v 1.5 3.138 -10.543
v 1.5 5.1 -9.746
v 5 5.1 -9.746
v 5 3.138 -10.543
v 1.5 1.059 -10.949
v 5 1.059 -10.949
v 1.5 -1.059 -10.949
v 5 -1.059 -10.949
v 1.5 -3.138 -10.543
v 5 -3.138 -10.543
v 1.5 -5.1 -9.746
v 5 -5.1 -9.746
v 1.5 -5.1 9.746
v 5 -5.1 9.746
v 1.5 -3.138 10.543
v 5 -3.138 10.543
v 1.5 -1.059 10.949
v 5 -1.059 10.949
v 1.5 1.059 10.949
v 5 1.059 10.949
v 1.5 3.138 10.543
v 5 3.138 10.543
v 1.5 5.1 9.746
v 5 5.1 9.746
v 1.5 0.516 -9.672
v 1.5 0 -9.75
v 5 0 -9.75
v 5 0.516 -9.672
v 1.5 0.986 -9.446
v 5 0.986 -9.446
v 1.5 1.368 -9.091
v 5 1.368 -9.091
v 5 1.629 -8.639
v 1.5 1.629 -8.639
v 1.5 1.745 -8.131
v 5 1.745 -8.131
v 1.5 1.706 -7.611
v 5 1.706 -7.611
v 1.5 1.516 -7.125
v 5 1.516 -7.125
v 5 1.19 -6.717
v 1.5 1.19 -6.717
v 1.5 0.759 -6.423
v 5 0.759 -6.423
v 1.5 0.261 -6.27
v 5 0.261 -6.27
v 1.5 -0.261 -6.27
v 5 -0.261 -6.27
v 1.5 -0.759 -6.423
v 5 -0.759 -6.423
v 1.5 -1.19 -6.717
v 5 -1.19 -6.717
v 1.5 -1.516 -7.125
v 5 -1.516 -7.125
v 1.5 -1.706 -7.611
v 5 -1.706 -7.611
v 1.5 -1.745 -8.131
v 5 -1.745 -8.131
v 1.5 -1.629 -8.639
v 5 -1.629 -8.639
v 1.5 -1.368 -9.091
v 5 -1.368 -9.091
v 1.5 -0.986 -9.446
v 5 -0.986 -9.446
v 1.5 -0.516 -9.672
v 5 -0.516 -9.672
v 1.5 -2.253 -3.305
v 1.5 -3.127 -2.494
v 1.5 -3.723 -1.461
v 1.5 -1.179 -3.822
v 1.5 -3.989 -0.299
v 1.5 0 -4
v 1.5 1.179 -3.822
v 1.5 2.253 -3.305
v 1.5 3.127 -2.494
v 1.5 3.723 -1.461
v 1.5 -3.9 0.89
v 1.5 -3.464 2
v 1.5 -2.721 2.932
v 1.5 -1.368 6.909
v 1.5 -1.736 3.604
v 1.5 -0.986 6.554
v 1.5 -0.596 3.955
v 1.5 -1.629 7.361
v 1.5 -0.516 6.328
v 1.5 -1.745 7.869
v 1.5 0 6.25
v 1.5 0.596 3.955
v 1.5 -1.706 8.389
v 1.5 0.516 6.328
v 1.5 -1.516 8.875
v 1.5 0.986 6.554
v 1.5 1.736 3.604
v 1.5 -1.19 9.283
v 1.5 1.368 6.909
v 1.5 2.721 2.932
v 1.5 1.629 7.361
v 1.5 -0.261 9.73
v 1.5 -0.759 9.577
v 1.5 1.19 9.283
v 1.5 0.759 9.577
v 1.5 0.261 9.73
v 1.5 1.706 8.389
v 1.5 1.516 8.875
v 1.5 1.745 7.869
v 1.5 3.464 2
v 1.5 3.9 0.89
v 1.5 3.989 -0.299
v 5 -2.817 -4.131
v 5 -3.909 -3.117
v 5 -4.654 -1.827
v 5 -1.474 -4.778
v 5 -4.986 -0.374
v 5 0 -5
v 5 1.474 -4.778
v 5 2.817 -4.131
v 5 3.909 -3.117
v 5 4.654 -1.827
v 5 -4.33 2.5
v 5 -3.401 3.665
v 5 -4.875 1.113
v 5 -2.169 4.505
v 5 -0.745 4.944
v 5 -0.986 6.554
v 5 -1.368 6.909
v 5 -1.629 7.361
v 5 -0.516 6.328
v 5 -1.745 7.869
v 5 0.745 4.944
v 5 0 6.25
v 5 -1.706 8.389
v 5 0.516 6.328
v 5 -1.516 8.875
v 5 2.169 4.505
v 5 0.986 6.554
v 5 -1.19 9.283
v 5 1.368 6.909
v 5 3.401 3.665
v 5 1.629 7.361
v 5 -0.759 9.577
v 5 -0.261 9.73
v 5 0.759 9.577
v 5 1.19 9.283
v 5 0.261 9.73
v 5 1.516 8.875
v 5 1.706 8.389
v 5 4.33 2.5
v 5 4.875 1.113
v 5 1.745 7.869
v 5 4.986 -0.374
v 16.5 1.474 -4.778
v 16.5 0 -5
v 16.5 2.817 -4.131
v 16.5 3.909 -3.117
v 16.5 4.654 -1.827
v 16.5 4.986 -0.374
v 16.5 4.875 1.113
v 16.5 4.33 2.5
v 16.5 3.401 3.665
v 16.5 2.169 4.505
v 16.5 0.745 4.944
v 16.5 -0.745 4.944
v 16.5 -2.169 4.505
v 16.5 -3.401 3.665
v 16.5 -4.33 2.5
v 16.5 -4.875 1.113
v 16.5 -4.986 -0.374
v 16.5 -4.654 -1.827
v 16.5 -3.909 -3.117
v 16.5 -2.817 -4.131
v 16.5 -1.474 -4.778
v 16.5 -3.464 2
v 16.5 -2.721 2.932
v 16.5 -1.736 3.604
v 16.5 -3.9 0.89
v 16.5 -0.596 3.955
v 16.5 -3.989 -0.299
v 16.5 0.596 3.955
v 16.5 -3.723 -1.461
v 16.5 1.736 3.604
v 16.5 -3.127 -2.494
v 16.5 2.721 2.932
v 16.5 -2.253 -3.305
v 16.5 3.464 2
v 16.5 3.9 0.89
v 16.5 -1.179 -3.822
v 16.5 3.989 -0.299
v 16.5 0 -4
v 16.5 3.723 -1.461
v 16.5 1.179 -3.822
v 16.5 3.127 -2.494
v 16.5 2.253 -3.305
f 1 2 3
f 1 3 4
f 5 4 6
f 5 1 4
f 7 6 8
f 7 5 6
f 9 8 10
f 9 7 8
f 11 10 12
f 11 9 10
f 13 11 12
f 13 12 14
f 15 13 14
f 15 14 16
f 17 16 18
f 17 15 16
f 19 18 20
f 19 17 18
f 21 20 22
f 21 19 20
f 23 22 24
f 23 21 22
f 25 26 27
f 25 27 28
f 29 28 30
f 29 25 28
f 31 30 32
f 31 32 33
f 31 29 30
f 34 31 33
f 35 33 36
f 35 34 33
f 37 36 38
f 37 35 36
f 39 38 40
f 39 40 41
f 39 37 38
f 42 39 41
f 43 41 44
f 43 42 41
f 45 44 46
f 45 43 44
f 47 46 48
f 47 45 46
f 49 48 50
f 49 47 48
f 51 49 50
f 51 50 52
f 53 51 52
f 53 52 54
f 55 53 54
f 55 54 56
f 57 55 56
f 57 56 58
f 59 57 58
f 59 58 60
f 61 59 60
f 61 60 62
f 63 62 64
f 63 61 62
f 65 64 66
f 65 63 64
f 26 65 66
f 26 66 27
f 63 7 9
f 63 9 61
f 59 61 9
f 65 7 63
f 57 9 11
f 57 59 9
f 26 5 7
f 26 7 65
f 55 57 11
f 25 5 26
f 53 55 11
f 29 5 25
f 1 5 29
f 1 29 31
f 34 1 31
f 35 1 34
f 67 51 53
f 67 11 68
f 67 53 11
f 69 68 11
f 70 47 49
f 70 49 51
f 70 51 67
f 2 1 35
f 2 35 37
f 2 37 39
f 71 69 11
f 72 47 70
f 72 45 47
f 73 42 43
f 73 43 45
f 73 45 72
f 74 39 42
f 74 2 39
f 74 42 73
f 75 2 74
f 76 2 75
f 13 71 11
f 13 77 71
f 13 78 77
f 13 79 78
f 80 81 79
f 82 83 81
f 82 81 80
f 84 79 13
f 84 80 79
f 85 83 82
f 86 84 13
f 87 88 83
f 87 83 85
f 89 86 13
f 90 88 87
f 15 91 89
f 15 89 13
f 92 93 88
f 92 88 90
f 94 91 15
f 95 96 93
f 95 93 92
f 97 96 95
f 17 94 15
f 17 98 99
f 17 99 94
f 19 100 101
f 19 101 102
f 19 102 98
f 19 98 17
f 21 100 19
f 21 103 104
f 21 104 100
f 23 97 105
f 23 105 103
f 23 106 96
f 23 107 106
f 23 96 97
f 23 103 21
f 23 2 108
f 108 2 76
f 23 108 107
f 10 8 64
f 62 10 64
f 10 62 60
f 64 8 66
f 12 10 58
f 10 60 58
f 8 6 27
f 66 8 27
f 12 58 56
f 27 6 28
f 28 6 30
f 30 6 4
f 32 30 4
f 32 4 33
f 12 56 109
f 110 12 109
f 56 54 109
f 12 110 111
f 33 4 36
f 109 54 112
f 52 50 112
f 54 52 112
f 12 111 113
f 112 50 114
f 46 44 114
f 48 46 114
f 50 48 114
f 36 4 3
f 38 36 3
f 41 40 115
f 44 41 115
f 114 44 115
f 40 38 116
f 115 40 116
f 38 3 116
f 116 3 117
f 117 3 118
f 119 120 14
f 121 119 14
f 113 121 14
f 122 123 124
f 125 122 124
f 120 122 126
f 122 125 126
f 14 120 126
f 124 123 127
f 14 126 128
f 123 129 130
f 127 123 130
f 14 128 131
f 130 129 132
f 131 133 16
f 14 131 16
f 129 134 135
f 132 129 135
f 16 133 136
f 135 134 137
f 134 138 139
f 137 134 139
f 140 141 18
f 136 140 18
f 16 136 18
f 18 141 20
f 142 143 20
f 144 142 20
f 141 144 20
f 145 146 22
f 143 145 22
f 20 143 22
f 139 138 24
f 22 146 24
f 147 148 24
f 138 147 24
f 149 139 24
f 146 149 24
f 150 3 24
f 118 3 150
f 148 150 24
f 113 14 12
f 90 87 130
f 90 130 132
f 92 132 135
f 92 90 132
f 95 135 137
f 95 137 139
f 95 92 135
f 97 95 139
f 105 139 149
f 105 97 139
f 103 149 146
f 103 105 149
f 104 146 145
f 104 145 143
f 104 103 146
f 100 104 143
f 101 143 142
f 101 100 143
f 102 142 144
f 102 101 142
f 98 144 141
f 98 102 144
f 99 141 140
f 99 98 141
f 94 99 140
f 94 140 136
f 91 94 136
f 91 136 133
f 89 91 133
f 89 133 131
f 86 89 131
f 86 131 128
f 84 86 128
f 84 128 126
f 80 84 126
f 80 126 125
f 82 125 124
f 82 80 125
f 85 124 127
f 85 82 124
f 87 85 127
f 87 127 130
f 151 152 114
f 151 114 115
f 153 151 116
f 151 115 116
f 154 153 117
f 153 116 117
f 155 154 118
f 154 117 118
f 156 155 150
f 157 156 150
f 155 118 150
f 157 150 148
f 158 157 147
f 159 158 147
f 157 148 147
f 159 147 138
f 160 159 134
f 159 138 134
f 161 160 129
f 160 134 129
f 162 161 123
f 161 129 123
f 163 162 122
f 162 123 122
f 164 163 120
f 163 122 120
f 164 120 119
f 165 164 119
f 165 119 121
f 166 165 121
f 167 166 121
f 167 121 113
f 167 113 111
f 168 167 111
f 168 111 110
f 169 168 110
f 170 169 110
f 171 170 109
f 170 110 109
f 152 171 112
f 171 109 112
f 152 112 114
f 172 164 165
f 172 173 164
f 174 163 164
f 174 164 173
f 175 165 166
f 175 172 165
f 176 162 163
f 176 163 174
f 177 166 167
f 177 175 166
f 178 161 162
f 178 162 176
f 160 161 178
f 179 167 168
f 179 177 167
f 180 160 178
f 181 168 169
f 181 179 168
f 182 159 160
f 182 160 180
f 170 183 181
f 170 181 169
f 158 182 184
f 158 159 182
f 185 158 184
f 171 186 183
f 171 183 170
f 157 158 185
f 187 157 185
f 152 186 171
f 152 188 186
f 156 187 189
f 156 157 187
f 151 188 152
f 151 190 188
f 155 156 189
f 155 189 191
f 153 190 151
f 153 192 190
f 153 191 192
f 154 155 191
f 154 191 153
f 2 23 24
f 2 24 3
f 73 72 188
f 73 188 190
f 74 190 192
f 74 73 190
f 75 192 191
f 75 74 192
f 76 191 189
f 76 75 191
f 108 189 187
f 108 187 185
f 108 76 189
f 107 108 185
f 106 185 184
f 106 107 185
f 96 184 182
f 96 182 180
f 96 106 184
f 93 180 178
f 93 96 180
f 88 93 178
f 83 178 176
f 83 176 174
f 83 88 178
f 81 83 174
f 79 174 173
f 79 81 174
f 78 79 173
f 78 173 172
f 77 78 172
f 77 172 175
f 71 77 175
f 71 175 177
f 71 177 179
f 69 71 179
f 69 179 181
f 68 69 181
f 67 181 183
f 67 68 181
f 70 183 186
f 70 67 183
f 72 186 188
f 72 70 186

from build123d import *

# Parameters (mm, degrees)
SKETCH_1_R          = 5
SKETCH_1_R_2        = 4
EXTRUDE_1_DEPTH     = 1.5
SKETCH_2_R          = 4
SKETCH_2_R_2        = 1.75
EXTRUDE_2_DEPTH     = 3.5
SKETCH_3_R          = 5
SKETCH_3_R_2        = 4
EXTRUDE_3_DEPTH     = 11.5
SKETCH_4_R          = 5
CUT_EXTRUDE_1_DEPTH = 1.5


with BuildPart() as part:
    # 草图1 → 凸台-拉伸1 (new body)
    with BuildSketch(Plane(origin=(0, 0, 0), x_dir=(0, 0, -1), z_dir=(1, 0, 0))):
        Circle(SKETCH_1_R)
        Circle(SKETCH_1_R_2, mode=Mode.SUBTRACT)
    extrude(amount=EXTRUDE_1_DEPTH)

    # 草图2 → 凸台-拉伸2 (add)
    with BuildSketch(Plane(origin=(1.5, 0, 0), x_dir=(0, 0, -1), z_dir=(1, 0, 0))):
        with BuildLine():
            Line((-9.746281342, 5.1), (9.746281342, 5.1))
            ThreePointArc((9.746281342, 5.1), (11, 0), (9.746281342, -5.1))
            Line((9.746281342, -5.1), (-9.746281342, -5.1))
            ThreePointArc((-9.746281342, -5.1), (-11, 0), (-9.746281342, 5.1))
        make_face()
        Circle(SKETCH_2_R, mode=Mode.SUBTRACT)
        with Locations((-8, 0)):
            Circle(SKETCH_2_R_2, mode=Mode.SUBTRACT)
        with Locations((8, 0)):
            Circle(SKETCH_2_R_2, mode=Mode.SUBTRACT)
    extrude(amount=EXTRUDE_2_DEPTH)

    # 草图3 → 凸台-拉伸3 (add)
    with BuildSketch(Plane(origin=(5, 0, 0), x_dir=(0, 0, -1), z_dir=(1, 0, 0))):
        Circle(SKETCH_3_R)
        Circle(SKETCH_3_R_2, mode=Mode.SUBTRACT)
    extrude(amount=EXTRUDE_3_DEPTH)

    # 草图4 → 切除-拉伸1 (cut)
    with BuildSketch(Plane.ZY):
        with Locations(Location((0, 0, 0), (0, 0, 180))):
            Circle(SKETCH_4_R)
    extrude(amount=-CUT_EXTRUDE_1_DEPTH, mode=Mode.SUBTRACT)


solid = part.part
